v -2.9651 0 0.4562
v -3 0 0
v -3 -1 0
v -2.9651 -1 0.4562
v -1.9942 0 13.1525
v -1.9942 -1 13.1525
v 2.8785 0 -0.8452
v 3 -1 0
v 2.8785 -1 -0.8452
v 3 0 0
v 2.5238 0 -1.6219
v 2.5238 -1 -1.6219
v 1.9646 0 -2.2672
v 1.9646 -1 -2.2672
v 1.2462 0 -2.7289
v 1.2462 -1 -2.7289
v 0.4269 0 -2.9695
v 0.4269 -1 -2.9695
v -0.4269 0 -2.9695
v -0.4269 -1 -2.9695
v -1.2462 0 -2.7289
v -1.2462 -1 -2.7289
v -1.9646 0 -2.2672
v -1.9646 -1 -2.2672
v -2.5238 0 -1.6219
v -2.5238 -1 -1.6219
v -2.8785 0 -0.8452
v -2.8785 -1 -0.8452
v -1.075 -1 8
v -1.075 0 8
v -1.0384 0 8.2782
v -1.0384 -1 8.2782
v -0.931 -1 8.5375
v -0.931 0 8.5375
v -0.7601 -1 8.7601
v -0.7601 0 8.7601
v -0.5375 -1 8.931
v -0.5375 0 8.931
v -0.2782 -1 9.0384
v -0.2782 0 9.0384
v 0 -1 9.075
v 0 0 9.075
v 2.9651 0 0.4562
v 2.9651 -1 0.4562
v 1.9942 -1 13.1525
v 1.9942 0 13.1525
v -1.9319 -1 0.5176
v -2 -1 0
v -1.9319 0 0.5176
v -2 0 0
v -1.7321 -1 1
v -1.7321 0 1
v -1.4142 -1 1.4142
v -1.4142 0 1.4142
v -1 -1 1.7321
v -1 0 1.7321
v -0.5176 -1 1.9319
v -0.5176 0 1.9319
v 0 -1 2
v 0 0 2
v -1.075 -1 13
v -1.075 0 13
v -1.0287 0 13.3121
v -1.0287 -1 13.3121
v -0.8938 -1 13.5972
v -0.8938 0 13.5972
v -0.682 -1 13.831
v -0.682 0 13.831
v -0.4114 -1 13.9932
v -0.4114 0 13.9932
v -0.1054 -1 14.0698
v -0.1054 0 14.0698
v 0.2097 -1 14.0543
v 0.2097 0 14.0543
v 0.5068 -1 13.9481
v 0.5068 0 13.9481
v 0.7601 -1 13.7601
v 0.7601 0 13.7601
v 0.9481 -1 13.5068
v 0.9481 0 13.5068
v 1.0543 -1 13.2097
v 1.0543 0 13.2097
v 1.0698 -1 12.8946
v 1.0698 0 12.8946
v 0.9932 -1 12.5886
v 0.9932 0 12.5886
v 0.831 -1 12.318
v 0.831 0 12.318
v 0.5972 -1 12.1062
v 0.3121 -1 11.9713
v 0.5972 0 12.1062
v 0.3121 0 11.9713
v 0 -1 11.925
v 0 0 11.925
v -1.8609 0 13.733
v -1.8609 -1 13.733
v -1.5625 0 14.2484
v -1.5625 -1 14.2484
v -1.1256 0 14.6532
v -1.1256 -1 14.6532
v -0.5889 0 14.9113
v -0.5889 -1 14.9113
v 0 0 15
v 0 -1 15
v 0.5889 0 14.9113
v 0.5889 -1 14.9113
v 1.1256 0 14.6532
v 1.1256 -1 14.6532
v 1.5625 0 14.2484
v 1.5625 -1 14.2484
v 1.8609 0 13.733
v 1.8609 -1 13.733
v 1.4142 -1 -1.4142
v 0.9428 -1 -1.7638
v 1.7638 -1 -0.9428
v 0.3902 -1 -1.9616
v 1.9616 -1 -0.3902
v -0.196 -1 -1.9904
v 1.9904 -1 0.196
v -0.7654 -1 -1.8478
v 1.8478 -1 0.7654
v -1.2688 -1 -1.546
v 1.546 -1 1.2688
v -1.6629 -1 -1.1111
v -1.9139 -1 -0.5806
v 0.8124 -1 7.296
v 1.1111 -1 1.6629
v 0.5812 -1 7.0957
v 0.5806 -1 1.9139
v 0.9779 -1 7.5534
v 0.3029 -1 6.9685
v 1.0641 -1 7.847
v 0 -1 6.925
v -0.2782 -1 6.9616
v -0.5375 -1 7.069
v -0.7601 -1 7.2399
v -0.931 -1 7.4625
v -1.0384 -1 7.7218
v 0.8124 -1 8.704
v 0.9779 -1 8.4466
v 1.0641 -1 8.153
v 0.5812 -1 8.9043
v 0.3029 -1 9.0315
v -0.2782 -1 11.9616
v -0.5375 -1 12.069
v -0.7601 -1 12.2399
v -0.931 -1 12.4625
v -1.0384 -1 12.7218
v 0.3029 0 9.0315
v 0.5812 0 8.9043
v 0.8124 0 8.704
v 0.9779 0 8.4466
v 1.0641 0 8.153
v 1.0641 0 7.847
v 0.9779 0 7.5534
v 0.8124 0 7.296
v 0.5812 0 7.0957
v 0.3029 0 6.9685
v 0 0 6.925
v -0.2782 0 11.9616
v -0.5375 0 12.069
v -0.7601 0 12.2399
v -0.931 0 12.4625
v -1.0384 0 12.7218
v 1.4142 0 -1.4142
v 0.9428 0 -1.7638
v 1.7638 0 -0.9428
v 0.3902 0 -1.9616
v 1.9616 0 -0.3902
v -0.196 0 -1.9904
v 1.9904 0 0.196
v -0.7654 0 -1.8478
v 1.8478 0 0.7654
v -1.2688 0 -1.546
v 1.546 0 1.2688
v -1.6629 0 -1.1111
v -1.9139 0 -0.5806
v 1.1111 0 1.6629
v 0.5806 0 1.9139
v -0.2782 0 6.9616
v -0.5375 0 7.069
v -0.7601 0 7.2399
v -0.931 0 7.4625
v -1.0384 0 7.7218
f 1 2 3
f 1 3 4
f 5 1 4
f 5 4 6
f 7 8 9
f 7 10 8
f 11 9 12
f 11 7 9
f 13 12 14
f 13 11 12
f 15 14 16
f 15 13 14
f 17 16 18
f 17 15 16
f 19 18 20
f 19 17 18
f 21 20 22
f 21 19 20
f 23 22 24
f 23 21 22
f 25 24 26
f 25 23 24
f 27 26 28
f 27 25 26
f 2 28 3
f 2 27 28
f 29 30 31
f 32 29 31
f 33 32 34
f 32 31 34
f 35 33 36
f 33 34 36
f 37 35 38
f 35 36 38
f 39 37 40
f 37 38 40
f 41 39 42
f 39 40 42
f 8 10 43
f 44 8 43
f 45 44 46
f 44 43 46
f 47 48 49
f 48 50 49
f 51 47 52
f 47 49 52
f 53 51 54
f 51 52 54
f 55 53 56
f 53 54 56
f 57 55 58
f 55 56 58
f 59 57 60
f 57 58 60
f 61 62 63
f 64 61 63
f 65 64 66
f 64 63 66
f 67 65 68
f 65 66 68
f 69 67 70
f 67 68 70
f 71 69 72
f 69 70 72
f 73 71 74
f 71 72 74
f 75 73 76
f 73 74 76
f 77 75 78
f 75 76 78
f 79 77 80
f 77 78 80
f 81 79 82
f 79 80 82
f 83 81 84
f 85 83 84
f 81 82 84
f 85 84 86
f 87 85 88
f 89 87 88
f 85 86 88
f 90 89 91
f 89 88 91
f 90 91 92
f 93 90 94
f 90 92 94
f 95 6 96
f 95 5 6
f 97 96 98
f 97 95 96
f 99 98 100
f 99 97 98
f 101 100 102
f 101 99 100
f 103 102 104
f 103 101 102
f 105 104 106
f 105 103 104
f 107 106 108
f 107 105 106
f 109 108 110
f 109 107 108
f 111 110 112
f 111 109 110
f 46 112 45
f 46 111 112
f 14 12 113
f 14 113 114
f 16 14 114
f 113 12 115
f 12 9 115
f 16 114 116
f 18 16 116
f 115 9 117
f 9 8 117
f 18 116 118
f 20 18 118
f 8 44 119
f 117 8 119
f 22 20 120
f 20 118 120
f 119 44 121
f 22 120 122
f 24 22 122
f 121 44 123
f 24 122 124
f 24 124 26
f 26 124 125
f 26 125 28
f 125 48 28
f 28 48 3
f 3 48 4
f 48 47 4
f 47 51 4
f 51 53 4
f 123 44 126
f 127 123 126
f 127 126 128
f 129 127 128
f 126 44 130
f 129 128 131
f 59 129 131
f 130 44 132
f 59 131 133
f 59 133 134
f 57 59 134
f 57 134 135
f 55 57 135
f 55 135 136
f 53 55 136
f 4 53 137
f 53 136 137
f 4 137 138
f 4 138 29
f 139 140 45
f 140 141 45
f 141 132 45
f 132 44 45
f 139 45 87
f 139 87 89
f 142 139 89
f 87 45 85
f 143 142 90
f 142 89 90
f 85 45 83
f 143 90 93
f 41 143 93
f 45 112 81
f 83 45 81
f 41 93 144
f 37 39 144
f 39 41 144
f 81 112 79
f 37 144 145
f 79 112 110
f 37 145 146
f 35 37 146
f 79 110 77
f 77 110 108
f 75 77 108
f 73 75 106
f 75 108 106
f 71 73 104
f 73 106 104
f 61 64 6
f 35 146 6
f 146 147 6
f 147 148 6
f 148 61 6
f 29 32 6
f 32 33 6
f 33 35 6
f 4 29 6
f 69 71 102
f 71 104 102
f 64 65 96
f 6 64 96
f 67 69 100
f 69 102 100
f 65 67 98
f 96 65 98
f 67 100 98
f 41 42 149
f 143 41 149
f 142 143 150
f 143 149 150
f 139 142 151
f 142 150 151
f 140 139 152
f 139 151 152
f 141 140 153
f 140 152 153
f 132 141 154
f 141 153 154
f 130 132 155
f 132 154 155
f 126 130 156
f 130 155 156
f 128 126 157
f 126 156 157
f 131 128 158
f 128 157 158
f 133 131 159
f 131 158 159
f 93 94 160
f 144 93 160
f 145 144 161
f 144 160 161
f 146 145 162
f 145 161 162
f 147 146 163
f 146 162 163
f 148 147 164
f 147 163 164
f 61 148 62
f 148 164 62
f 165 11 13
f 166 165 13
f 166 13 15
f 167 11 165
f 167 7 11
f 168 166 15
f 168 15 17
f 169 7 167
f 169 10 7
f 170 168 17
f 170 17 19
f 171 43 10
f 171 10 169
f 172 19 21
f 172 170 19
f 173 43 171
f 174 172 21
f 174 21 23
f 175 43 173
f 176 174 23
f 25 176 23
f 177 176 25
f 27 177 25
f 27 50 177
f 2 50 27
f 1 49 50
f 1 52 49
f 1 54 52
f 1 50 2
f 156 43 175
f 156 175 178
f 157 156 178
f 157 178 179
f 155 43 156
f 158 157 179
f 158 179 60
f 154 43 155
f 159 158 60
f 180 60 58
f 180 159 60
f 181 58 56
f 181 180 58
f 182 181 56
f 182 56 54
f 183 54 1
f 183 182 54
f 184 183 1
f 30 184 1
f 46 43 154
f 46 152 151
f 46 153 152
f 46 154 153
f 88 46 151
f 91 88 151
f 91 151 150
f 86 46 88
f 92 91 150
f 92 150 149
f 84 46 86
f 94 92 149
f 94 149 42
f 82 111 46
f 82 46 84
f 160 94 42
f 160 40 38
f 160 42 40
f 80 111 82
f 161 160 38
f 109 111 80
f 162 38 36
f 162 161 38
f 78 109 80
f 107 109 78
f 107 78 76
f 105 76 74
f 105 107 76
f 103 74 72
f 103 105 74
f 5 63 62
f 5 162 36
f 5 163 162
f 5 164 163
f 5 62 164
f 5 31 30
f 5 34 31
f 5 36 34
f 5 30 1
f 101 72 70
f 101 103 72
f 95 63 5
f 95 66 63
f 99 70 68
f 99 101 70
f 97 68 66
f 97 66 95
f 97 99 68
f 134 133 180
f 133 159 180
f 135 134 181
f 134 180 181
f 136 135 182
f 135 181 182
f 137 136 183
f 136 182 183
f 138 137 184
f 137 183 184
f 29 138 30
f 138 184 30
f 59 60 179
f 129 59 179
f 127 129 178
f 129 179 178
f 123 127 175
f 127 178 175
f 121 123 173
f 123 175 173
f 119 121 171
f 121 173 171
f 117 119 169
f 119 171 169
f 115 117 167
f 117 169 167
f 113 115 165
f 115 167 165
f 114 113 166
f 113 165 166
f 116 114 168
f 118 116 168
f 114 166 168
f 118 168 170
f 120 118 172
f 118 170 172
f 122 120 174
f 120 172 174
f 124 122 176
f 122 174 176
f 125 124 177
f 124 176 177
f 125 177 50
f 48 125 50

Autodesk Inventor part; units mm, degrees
ref_plane "YZ Plane" through (0, 0, 0) normal (1, 0, 0) x (0, 1, 0)
ref_plane "XZ Plane" through (0, 0, 0) normal (0, 1, 0) x (-1, 0, 0)
ref_plane "XY Plane" through (0, 0, 0) normal (0, 0, 1) x (1, 0, 0)
sketch "Sketch1" plane through (0, 0, 0) normal (0, 1, 0) x (-1, 0, 0)
  arc A0 (-2.9651, 0.4562) -> (2.9651, 0.4562) centre (0, 0) ccw
  line L0 (0, 0) -> (0, 8)
  circle A1 centre (0, 8) radius 1.075
  line L1 (0, 8) -> (0, 13)
  circle A2 centre (0, 13) radius 1.075
  arc A3 (1.9942, 13.1525) -> (-1.9942, 13.1525) centre (0, 13) ccw
  line L2 (3, 0) -> (1.9942, 13.1525)
  line L3 (-3, 0) -> (-1.9942, 13.1525)
  circle A4 centre (0, 0) radius 2
  dimension "d0" = 6
  dimension "d1" = 8
  dimension "d2" = 2.15
  dimension "d3" = 5
  dimension "d4" = 2.15
  dimension "d5" = 4
  dimension "d6" = 4
extrude "Extrusion1" add sketch "Sketch1" against normal blind 1 contours L3 A3 L2 A0
properties part number "servoya giden parca"
